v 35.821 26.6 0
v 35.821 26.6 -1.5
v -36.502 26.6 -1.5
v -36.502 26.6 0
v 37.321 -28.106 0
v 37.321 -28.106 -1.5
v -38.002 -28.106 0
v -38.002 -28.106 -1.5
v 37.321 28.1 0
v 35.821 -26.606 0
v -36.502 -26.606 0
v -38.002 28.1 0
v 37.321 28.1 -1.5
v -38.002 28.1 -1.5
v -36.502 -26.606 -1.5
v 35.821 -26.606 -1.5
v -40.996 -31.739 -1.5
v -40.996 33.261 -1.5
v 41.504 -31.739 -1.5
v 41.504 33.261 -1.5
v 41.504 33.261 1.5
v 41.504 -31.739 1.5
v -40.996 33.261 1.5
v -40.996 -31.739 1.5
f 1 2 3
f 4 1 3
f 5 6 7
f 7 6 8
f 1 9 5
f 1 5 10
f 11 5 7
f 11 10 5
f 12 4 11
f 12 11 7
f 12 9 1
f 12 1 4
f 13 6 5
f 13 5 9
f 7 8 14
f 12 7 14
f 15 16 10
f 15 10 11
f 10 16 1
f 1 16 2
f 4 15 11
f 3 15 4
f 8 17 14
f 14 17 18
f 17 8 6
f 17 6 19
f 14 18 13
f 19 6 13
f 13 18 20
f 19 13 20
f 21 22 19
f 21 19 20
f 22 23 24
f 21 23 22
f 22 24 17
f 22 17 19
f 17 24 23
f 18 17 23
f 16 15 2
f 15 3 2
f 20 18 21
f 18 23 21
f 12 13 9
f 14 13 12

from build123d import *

# Parameters (mm, degrees)
SKETCH1_W           = 82.5
SKETCH1_H           = 65
BOSS_EXTRUDE1_DEPTH = 1.5
SKETCH2_W           = 75.322744119
SKETCH2_H           = 56.205881557
SKETCH2_W_2         = 72.322744119
SKETCH2_H_2         = 53.205881557
CUT_EXTRUDE1_DEPTH  = 1.5


with BuildPart() as part:
    # Sketch1 → Boss-Extrude1 (new, symmetric)
    with BuildSketch(Plane.XY):
        with Locations((0.253524641, 0.760573924)):
            Rectangle(SKETCH1_W, SKETCH1_H)
    extrude(amount=BOSS_EXTRUDE1_DEPTH, both=True)

    # Sketch2 → Cut-Extrude1 (cut)
    with BuildSketch(Plane(origin=(0, 0, -1.5), x_dir=(-1, 0, 0), z_dir=(0, 0, -1))):
        with Locations((0.340133491, -0.002700818)):
            Rectangle(SKETCH2_W, SKETCH2_H)
        with Locations((0.340133491, -0.002700818)):
            Rectangle(SKETCH2_W_2, SKETCH2_H_2, mode=Mode.SUBTRACT)
    extrude(amount=-CUT_EXTRUDE1_DEPTH, mode=Mode.SUBTRACT)


solid = part.part
